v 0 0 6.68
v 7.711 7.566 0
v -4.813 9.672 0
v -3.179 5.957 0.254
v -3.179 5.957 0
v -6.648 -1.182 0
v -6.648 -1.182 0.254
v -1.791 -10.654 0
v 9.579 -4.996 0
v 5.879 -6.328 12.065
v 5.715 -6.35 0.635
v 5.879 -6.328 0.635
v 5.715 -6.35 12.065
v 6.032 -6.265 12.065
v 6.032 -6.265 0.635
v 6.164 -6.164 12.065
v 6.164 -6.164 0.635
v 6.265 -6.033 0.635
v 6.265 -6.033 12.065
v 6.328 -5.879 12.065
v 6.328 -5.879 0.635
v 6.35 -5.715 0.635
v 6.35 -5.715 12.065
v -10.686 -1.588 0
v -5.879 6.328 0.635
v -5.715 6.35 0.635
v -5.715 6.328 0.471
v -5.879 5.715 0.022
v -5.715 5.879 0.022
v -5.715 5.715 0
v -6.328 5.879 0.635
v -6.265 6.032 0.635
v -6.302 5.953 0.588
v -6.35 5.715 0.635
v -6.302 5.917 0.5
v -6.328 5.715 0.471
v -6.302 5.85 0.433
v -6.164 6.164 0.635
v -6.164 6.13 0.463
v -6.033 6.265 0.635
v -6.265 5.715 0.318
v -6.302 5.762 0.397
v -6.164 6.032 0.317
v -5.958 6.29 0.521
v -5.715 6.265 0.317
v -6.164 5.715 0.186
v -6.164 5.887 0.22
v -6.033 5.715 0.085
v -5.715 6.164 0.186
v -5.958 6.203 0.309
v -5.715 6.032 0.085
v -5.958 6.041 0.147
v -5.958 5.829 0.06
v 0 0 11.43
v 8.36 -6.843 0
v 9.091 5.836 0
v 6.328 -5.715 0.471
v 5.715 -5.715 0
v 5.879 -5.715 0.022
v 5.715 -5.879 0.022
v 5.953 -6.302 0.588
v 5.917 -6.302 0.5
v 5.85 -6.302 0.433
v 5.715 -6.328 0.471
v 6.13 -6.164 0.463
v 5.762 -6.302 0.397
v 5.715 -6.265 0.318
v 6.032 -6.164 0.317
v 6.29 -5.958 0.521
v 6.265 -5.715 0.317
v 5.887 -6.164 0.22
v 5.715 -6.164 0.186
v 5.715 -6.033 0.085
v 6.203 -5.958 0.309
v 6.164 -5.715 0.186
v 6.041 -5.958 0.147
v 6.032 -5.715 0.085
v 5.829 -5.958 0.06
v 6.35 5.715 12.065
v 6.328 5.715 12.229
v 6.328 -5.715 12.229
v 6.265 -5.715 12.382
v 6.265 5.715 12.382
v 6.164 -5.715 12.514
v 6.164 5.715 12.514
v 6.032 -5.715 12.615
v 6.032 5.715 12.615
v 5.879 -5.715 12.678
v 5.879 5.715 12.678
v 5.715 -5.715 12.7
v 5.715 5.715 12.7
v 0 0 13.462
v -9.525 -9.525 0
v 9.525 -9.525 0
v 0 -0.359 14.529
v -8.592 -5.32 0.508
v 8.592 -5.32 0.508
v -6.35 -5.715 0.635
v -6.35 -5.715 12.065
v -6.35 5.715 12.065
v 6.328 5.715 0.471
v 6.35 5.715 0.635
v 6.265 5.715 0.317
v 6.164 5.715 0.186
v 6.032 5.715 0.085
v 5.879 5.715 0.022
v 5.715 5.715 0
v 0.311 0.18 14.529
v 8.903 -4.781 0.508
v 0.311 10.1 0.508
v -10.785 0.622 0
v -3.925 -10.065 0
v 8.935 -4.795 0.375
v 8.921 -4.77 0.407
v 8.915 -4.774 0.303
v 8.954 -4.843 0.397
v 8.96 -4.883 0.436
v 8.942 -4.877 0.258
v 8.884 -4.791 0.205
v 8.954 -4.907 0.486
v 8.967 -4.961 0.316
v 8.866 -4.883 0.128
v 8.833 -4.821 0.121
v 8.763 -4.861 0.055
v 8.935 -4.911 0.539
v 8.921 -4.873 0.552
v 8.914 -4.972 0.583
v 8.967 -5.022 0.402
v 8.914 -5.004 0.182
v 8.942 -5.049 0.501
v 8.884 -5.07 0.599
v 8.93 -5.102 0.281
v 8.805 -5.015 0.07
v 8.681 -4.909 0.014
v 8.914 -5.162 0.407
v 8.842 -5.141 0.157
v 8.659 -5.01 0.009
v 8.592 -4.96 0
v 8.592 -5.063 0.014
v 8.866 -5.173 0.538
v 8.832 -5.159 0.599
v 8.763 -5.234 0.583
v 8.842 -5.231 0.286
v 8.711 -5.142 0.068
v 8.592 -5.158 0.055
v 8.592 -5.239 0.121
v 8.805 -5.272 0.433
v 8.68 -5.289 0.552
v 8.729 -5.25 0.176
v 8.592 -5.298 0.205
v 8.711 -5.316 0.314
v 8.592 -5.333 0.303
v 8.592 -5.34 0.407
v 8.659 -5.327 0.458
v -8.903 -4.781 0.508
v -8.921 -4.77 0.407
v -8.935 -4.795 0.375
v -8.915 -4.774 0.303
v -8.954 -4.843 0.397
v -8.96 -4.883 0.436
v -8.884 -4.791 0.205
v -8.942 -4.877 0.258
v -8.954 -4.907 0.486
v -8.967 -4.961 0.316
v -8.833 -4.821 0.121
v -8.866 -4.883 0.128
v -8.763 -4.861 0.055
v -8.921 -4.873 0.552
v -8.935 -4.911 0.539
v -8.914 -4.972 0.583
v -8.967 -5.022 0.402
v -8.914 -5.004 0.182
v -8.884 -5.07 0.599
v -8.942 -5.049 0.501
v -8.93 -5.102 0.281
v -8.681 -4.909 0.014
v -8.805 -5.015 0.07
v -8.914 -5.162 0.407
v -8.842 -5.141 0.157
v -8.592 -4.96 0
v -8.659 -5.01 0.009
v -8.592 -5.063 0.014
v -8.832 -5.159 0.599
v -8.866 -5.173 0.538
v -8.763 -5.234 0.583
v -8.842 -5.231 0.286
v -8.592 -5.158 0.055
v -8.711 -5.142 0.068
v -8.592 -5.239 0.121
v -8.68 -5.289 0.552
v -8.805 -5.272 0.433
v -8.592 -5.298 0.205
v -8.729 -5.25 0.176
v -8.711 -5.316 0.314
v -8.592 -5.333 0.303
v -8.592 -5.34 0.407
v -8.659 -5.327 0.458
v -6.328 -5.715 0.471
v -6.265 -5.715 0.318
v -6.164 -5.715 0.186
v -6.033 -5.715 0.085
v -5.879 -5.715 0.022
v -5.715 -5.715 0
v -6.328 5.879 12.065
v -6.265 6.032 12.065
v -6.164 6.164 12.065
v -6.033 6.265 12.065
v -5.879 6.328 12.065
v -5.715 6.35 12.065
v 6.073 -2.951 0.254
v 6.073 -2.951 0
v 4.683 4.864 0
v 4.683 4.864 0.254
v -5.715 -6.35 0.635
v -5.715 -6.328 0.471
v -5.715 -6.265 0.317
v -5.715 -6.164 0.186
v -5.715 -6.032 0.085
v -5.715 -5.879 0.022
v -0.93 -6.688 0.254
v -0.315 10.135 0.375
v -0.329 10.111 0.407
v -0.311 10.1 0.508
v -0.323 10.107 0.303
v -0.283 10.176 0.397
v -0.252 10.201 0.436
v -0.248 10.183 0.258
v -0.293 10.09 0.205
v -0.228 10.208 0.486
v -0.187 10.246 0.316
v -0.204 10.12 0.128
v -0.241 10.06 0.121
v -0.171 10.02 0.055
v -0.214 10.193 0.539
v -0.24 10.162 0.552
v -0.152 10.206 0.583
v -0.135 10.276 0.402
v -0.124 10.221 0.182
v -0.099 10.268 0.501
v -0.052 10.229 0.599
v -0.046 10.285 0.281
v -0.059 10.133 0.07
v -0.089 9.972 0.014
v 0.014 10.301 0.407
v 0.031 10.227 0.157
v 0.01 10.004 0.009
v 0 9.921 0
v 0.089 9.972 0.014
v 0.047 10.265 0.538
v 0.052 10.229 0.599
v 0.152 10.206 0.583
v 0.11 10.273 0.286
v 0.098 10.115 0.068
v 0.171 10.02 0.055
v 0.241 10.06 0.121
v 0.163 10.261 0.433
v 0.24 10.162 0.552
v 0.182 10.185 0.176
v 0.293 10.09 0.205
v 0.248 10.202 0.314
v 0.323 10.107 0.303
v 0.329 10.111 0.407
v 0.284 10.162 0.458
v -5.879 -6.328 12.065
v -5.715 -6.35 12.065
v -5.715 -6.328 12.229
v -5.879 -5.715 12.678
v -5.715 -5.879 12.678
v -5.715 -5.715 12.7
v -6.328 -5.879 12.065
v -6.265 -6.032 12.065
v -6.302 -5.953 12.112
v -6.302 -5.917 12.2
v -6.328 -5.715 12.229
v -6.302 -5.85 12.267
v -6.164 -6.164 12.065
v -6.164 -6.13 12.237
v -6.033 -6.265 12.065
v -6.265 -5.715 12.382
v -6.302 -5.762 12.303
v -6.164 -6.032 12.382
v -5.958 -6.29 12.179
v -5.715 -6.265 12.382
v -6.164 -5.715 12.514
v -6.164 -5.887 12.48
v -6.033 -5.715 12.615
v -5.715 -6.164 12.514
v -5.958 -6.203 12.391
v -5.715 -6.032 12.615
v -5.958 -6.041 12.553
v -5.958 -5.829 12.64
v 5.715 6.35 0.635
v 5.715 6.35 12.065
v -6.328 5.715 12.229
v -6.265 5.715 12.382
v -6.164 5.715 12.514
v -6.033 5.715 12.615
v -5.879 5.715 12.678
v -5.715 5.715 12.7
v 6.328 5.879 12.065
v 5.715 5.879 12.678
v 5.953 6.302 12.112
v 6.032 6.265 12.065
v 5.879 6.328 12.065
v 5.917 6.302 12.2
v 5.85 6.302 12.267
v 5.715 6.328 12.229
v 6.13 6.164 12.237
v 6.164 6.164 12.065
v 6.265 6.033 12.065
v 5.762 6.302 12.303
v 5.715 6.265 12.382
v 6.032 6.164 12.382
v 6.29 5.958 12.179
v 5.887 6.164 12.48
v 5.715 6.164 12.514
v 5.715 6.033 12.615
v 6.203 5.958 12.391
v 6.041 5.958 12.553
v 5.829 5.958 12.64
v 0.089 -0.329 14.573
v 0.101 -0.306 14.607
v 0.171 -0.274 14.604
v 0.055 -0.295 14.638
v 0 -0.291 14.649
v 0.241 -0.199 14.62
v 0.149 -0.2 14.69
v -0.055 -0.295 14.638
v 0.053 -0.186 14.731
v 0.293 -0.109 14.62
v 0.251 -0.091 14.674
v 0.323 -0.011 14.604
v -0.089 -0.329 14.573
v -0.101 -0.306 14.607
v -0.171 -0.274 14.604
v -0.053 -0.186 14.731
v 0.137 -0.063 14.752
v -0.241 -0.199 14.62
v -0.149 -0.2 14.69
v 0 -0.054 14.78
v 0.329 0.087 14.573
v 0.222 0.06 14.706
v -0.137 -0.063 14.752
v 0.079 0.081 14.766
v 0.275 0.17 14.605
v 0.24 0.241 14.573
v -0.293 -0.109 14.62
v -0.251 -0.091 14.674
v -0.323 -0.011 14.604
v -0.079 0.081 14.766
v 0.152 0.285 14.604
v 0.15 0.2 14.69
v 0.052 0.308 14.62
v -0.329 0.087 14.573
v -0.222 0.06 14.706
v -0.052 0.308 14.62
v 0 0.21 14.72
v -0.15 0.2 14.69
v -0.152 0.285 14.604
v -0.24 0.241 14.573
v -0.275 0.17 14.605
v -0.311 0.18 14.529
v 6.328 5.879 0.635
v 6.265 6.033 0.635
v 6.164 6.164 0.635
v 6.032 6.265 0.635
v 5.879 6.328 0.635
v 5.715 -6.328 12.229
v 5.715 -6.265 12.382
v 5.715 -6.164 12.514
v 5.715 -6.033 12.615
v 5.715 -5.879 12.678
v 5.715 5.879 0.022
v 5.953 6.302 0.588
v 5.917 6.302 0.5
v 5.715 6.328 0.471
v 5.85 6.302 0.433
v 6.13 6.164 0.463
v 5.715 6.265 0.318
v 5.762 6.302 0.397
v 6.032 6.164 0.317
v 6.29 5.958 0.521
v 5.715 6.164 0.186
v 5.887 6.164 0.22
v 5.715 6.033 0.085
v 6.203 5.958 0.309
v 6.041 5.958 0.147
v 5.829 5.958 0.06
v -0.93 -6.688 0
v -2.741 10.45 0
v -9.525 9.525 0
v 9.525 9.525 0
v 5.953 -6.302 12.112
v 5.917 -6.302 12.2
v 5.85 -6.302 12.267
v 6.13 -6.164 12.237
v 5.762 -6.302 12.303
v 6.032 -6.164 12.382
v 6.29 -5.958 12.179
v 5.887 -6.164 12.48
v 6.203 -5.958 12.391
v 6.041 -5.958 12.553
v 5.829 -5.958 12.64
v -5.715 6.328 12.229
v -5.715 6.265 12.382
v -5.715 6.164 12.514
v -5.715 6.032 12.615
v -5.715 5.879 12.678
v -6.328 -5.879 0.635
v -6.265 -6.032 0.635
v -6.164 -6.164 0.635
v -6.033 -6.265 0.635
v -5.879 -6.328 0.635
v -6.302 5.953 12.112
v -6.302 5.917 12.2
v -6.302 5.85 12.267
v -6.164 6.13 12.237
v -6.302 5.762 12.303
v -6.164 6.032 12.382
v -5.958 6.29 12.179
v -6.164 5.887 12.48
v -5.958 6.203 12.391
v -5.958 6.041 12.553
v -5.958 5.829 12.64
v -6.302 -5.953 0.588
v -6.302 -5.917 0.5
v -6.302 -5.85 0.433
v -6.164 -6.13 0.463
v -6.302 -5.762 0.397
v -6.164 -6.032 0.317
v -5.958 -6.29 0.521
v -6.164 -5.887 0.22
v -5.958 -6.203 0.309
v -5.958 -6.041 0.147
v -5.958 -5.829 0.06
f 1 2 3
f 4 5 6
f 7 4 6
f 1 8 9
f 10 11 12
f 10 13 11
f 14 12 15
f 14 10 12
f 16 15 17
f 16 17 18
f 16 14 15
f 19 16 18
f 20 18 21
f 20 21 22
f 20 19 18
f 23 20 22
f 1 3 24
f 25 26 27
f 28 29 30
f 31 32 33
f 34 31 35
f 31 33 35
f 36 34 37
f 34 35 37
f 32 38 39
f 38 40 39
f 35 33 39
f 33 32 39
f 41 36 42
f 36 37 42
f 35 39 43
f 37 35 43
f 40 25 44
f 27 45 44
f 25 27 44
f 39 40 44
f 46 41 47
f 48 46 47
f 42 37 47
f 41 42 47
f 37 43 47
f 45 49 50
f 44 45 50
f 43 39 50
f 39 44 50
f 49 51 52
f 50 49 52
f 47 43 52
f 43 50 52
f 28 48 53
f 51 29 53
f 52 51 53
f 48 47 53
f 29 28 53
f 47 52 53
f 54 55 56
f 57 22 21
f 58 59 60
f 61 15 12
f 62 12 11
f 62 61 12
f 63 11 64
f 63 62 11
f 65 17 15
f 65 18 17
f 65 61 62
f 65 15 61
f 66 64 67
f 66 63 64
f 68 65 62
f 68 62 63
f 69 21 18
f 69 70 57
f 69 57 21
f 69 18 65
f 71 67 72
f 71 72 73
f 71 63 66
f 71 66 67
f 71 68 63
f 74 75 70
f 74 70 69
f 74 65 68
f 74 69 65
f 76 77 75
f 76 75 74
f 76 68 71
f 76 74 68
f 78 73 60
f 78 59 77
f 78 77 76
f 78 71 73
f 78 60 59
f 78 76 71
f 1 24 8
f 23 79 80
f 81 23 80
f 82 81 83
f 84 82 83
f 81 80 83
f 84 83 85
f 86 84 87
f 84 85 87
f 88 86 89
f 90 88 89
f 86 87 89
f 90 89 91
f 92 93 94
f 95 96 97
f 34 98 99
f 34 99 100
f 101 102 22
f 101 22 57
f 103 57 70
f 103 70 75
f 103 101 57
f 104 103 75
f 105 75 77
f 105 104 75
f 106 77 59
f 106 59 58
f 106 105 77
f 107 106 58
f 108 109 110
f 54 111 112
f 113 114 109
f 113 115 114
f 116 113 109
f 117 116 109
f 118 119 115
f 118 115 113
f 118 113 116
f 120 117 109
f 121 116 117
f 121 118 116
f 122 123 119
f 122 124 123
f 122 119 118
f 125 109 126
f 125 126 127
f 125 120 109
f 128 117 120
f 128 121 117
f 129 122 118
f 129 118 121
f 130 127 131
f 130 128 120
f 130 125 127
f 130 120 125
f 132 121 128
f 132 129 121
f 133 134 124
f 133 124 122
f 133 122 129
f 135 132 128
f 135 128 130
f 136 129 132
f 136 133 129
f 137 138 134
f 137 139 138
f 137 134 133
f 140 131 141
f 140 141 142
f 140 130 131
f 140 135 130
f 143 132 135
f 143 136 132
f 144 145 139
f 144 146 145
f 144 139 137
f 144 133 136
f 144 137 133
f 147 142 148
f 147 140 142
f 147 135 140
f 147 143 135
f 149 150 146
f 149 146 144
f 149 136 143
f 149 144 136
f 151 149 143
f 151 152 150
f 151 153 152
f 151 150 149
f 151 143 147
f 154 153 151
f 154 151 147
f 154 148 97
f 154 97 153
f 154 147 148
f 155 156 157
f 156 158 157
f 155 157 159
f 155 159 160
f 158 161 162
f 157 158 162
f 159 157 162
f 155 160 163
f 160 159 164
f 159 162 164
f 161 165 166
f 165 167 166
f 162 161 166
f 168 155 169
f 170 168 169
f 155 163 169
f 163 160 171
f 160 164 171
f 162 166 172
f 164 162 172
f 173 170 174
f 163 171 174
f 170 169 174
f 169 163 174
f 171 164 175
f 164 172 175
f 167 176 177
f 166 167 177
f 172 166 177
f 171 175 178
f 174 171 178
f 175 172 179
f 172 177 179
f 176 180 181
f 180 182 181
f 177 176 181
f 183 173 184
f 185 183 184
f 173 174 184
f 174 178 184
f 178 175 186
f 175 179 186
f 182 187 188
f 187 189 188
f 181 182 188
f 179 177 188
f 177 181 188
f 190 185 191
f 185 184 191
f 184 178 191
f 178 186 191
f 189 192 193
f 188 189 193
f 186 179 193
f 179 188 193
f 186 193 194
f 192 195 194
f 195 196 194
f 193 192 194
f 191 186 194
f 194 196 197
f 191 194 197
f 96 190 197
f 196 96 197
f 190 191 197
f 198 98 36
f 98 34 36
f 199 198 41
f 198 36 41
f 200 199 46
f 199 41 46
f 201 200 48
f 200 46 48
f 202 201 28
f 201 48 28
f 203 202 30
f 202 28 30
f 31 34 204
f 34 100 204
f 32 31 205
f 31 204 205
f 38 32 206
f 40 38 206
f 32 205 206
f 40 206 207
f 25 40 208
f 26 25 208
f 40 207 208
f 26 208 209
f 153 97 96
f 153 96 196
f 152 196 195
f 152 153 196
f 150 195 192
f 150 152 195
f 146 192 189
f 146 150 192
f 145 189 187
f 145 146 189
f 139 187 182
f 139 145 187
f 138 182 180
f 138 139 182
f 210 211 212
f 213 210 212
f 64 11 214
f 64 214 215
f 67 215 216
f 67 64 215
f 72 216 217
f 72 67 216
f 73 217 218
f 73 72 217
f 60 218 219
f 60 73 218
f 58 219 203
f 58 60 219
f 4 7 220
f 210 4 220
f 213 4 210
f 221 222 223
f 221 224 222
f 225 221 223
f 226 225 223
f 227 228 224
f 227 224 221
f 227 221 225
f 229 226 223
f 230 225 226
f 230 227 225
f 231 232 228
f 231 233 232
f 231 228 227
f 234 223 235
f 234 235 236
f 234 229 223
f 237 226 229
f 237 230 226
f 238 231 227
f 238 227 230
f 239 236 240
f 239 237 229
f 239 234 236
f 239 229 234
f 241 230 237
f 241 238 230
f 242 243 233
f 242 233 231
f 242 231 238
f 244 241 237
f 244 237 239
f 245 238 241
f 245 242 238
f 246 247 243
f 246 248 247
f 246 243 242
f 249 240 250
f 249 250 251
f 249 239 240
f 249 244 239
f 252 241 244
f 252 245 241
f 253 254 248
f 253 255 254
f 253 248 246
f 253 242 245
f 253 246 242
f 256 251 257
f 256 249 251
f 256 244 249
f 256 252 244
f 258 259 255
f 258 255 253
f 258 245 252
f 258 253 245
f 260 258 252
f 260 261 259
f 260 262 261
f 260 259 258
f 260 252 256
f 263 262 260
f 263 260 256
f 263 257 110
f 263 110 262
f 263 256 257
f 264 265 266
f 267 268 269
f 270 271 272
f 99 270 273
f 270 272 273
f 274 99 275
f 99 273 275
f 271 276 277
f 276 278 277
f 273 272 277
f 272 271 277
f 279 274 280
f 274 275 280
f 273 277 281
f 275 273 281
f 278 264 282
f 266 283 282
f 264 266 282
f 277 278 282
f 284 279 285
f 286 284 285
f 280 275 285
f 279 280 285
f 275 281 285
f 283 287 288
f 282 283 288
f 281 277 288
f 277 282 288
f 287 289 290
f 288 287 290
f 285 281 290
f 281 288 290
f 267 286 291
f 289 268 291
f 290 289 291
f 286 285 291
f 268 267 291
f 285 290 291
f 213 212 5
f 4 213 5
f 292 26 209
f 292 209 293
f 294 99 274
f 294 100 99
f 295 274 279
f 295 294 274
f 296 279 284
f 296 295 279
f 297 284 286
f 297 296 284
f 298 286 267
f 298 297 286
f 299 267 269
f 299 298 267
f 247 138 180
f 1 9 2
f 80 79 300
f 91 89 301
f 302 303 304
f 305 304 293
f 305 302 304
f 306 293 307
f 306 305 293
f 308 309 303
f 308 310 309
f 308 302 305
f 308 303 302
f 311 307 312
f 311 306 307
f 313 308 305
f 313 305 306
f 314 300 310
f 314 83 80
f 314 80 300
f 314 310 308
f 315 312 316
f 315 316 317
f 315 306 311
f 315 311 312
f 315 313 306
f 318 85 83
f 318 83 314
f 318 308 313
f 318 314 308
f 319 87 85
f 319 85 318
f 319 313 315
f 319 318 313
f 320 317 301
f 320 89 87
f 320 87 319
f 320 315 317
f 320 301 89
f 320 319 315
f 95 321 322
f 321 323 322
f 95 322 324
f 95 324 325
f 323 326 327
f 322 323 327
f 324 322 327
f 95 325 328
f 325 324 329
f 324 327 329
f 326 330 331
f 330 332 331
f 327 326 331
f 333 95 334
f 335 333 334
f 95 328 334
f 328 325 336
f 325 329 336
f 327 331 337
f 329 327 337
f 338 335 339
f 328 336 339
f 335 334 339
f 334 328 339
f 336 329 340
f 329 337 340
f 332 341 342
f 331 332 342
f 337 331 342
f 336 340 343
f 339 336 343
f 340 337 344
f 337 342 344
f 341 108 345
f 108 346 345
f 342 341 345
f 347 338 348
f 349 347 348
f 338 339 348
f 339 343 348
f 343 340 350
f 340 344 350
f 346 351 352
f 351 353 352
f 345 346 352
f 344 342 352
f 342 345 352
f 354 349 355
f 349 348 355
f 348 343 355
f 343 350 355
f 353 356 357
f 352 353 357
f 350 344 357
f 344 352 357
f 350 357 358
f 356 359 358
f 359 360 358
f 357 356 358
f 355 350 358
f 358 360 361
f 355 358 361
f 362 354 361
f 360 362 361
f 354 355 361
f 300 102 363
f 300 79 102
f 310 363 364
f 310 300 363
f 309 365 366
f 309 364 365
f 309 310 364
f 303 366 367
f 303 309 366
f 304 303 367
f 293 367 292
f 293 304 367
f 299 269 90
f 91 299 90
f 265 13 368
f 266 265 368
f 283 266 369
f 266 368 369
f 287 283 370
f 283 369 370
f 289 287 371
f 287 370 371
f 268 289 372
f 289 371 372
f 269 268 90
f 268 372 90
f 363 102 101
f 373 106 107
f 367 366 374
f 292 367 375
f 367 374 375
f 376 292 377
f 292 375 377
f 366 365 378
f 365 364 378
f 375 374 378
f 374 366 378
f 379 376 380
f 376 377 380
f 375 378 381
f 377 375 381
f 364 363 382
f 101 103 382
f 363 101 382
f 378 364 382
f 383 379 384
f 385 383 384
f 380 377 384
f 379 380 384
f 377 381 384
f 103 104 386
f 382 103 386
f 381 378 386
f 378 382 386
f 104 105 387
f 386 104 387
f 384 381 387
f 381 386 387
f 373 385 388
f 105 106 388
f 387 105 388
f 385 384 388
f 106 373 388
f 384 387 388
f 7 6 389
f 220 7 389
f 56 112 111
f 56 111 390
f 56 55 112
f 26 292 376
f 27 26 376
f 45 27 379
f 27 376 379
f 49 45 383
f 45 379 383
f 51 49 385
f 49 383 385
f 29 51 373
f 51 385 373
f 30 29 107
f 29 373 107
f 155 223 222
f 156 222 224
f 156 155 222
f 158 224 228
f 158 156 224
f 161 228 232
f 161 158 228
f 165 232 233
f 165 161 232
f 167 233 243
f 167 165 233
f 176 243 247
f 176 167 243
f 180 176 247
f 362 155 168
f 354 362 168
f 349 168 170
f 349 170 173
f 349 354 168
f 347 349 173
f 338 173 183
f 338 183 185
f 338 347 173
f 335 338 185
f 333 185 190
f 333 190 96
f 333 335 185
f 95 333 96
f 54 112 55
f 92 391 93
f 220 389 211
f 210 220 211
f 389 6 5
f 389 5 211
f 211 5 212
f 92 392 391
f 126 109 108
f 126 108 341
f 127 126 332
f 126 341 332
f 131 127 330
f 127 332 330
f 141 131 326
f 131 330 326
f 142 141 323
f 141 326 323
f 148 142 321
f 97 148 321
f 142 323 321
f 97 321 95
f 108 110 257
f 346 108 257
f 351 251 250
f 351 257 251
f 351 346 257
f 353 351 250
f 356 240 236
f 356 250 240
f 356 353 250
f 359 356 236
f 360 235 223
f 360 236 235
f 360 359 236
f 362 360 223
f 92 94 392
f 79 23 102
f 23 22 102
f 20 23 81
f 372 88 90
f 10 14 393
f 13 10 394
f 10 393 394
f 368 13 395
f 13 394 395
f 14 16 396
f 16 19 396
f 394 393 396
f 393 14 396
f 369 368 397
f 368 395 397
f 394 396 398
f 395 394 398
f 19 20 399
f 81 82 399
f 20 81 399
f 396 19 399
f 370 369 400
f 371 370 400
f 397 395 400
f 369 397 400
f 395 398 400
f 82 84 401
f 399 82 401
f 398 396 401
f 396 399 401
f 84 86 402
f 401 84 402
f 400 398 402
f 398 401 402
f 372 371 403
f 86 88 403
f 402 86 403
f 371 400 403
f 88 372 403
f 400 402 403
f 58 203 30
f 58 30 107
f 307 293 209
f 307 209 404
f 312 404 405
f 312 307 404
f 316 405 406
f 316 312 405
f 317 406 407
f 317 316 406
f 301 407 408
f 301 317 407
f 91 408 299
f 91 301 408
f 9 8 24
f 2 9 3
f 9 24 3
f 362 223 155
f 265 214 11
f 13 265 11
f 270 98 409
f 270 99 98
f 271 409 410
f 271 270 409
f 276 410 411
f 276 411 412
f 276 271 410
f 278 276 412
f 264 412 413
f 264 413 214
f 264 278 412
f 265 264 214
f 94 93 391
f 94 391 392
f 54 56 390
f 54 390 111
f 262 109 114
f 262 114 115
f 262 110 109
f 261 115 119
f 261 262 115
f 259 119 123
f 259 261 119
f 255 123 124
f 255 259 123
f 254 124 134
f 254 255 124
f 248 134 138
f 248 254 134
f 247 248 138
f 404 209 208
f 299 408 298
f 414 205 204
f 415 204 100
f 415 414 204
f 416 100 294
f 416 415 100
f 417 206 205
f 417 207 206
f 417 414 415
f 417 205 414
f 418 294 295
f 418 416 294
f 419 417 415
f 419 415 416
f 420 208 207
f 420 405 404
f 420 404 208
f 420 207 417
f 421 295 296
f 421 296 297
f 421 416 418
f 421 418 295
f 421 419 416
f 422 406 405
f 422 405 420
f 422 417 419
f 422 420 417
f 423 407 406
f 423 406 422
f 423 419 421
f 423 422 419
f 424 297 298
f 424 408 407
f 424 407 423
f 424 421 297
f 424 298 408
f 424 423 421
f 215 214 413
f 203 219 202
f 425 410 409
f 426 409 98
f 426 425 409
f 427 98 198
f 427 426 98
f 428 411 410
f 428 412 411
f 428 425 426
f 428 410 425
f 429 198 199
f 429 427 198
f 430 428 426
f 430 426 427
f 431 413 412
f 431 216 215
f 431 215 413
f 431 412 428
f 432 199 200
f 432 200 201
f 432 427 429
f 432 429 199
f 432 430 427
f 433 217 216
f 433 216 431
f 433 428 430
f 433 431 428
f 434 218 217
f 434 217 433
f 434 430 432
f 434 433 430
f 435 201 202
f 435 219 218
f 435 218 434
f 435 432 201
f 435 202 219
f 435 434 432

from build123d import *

# Parameters (mm, degrees)
F6_W      = 12.7
F6_H      = 12.7
F7_DEPTH  = 12.7
F8_R      = 0.635
F9_R      = 0.381
F10_W     = 19.05
F10_H     = 19.05
F14_DEPTH = 0.254
F16_DEPTH = 0.254


with BuildPart() as f2:
    # F0 (on Top) → F2 section 0
    with BuildSketch(Plane.XY, mode=Mode.PRIVATE) as f2_s0:
        Polygon((-1.791358188, -10.6537118532), (9.5787219576, -4.9958608935), (7.7113339266, 7.566100018), (-4.8128554924, 9.6719678669), (-10.6858422038, -1.5884951381), align=None)
    loft([f2_s0.sketch, Vertex(0, 0, 6.6802)])


with BuildPart() as f5:
    # F3 (on Top) → F5 section 0
    with BuildSketch(Plane.XY, mode=Mode.PRIVATE) as f5_s0:
        Polygon((9.525, -5.499261314), (0, 10.9985226281), (-9.525, -5.499261314), align=None)
    loft([f5_s0.sketch, Vertex(0, 0, 15.5448)])

    # F9
    f9_edges = [f5.edges().sort_by_distance(p)[0] for p in [
        (0, -5.499261, 0),
        (4.7625, 2.749631, 0),
        (-4.7625, 2.749631, 0),
        (0, 5.499261, 7.7724),
        (4.7625, -2.749631, 7.7724),
        (-4.7625, -2.749631, 7.7724),
    ]]
    fillet(f9_edges, radius=F9_R)


with BuildPart() as f7:
    # F6 (on Top) → F7 (new body)
    with BuildSketch(Plane.XY):
        Rectangle(F6_W, F6_H)
    extrude(amount=F7_DEPTH)

    # F8
    f8_edges = [f7.edges().sort_by_distance(p)[0] for p in [
        (6.35, 0, 12.7),
        (6.35, 0, 0),
        (6.35, 6.35, 6.35),
        (6.35, -6.35, 6.35),
        (0, 6.35, 12.7),
        (0, -6.35, 12.7),
        (0, -6.35, 0),
        (0, 6.35, 0),
        (-6.35, -6.35, 6.35),
        (-6.35, 6.35, 6.35),
        (-6.35, 0, 0),
        (-6.35, 0, 12.7),
    ]]
    fillet(f8_edges, radius=F8_R)


with BuildPart() as f12:
    # F10 (on Top) → F12 section 0
    with BuildSketch(Plane.XY, mode=Mode.PRIVATE) as f12_s0:
        Rectangle(F10_W, F10_H)
    loft([f12_s0.sketch, Vertex(0, 0, 13.462)])


with BuildPart() as f14:
    # F13 (on Top) → F14 (new body)
    with BuildSketch(Plane.XY):
        Polygon((-0.9300166294, -6.6876844959), (6.0729749752, -2.9511065379), (4.6833215769, 4.863800351), (-3.1785230604, 5.9571004693), (-6.6477568623, -1.1821097866), align=None)
    extrude(amount=F14_DEPTH)


with BuildPart() as f16:
    # F15 (on Top) → F16 (new body)
    with BuildSketch(Plane.XY):
        Polygon((-5.715, -5.0935079701), (0, -7.173597859), (5.715, -5.0935079701), (0, 8.701402141), align=None)
    extrude(amount=F16_DEPTH)


with BuildPart() as f19:
    # F17 (on Top) → F19 section 0
    with BuildSketch(Plane.XY, mode=Mode.PRIVATE) as f19_s0:
        Polygon((-3.9248414067, -10.0650961417), (8.3596325778, -6.8430317531), (9.0913784732, 5.8358699322), (-2.7408516767, 10.4497977251), (-10.7853179676, 0.6224602375), align=None)
    loft([f19_s0.sketch, Vertex(0, 0, 11.43)])


solid = Compound([f2.part, f5.part, f7.part, f12.part, f14.part, f19.part])
